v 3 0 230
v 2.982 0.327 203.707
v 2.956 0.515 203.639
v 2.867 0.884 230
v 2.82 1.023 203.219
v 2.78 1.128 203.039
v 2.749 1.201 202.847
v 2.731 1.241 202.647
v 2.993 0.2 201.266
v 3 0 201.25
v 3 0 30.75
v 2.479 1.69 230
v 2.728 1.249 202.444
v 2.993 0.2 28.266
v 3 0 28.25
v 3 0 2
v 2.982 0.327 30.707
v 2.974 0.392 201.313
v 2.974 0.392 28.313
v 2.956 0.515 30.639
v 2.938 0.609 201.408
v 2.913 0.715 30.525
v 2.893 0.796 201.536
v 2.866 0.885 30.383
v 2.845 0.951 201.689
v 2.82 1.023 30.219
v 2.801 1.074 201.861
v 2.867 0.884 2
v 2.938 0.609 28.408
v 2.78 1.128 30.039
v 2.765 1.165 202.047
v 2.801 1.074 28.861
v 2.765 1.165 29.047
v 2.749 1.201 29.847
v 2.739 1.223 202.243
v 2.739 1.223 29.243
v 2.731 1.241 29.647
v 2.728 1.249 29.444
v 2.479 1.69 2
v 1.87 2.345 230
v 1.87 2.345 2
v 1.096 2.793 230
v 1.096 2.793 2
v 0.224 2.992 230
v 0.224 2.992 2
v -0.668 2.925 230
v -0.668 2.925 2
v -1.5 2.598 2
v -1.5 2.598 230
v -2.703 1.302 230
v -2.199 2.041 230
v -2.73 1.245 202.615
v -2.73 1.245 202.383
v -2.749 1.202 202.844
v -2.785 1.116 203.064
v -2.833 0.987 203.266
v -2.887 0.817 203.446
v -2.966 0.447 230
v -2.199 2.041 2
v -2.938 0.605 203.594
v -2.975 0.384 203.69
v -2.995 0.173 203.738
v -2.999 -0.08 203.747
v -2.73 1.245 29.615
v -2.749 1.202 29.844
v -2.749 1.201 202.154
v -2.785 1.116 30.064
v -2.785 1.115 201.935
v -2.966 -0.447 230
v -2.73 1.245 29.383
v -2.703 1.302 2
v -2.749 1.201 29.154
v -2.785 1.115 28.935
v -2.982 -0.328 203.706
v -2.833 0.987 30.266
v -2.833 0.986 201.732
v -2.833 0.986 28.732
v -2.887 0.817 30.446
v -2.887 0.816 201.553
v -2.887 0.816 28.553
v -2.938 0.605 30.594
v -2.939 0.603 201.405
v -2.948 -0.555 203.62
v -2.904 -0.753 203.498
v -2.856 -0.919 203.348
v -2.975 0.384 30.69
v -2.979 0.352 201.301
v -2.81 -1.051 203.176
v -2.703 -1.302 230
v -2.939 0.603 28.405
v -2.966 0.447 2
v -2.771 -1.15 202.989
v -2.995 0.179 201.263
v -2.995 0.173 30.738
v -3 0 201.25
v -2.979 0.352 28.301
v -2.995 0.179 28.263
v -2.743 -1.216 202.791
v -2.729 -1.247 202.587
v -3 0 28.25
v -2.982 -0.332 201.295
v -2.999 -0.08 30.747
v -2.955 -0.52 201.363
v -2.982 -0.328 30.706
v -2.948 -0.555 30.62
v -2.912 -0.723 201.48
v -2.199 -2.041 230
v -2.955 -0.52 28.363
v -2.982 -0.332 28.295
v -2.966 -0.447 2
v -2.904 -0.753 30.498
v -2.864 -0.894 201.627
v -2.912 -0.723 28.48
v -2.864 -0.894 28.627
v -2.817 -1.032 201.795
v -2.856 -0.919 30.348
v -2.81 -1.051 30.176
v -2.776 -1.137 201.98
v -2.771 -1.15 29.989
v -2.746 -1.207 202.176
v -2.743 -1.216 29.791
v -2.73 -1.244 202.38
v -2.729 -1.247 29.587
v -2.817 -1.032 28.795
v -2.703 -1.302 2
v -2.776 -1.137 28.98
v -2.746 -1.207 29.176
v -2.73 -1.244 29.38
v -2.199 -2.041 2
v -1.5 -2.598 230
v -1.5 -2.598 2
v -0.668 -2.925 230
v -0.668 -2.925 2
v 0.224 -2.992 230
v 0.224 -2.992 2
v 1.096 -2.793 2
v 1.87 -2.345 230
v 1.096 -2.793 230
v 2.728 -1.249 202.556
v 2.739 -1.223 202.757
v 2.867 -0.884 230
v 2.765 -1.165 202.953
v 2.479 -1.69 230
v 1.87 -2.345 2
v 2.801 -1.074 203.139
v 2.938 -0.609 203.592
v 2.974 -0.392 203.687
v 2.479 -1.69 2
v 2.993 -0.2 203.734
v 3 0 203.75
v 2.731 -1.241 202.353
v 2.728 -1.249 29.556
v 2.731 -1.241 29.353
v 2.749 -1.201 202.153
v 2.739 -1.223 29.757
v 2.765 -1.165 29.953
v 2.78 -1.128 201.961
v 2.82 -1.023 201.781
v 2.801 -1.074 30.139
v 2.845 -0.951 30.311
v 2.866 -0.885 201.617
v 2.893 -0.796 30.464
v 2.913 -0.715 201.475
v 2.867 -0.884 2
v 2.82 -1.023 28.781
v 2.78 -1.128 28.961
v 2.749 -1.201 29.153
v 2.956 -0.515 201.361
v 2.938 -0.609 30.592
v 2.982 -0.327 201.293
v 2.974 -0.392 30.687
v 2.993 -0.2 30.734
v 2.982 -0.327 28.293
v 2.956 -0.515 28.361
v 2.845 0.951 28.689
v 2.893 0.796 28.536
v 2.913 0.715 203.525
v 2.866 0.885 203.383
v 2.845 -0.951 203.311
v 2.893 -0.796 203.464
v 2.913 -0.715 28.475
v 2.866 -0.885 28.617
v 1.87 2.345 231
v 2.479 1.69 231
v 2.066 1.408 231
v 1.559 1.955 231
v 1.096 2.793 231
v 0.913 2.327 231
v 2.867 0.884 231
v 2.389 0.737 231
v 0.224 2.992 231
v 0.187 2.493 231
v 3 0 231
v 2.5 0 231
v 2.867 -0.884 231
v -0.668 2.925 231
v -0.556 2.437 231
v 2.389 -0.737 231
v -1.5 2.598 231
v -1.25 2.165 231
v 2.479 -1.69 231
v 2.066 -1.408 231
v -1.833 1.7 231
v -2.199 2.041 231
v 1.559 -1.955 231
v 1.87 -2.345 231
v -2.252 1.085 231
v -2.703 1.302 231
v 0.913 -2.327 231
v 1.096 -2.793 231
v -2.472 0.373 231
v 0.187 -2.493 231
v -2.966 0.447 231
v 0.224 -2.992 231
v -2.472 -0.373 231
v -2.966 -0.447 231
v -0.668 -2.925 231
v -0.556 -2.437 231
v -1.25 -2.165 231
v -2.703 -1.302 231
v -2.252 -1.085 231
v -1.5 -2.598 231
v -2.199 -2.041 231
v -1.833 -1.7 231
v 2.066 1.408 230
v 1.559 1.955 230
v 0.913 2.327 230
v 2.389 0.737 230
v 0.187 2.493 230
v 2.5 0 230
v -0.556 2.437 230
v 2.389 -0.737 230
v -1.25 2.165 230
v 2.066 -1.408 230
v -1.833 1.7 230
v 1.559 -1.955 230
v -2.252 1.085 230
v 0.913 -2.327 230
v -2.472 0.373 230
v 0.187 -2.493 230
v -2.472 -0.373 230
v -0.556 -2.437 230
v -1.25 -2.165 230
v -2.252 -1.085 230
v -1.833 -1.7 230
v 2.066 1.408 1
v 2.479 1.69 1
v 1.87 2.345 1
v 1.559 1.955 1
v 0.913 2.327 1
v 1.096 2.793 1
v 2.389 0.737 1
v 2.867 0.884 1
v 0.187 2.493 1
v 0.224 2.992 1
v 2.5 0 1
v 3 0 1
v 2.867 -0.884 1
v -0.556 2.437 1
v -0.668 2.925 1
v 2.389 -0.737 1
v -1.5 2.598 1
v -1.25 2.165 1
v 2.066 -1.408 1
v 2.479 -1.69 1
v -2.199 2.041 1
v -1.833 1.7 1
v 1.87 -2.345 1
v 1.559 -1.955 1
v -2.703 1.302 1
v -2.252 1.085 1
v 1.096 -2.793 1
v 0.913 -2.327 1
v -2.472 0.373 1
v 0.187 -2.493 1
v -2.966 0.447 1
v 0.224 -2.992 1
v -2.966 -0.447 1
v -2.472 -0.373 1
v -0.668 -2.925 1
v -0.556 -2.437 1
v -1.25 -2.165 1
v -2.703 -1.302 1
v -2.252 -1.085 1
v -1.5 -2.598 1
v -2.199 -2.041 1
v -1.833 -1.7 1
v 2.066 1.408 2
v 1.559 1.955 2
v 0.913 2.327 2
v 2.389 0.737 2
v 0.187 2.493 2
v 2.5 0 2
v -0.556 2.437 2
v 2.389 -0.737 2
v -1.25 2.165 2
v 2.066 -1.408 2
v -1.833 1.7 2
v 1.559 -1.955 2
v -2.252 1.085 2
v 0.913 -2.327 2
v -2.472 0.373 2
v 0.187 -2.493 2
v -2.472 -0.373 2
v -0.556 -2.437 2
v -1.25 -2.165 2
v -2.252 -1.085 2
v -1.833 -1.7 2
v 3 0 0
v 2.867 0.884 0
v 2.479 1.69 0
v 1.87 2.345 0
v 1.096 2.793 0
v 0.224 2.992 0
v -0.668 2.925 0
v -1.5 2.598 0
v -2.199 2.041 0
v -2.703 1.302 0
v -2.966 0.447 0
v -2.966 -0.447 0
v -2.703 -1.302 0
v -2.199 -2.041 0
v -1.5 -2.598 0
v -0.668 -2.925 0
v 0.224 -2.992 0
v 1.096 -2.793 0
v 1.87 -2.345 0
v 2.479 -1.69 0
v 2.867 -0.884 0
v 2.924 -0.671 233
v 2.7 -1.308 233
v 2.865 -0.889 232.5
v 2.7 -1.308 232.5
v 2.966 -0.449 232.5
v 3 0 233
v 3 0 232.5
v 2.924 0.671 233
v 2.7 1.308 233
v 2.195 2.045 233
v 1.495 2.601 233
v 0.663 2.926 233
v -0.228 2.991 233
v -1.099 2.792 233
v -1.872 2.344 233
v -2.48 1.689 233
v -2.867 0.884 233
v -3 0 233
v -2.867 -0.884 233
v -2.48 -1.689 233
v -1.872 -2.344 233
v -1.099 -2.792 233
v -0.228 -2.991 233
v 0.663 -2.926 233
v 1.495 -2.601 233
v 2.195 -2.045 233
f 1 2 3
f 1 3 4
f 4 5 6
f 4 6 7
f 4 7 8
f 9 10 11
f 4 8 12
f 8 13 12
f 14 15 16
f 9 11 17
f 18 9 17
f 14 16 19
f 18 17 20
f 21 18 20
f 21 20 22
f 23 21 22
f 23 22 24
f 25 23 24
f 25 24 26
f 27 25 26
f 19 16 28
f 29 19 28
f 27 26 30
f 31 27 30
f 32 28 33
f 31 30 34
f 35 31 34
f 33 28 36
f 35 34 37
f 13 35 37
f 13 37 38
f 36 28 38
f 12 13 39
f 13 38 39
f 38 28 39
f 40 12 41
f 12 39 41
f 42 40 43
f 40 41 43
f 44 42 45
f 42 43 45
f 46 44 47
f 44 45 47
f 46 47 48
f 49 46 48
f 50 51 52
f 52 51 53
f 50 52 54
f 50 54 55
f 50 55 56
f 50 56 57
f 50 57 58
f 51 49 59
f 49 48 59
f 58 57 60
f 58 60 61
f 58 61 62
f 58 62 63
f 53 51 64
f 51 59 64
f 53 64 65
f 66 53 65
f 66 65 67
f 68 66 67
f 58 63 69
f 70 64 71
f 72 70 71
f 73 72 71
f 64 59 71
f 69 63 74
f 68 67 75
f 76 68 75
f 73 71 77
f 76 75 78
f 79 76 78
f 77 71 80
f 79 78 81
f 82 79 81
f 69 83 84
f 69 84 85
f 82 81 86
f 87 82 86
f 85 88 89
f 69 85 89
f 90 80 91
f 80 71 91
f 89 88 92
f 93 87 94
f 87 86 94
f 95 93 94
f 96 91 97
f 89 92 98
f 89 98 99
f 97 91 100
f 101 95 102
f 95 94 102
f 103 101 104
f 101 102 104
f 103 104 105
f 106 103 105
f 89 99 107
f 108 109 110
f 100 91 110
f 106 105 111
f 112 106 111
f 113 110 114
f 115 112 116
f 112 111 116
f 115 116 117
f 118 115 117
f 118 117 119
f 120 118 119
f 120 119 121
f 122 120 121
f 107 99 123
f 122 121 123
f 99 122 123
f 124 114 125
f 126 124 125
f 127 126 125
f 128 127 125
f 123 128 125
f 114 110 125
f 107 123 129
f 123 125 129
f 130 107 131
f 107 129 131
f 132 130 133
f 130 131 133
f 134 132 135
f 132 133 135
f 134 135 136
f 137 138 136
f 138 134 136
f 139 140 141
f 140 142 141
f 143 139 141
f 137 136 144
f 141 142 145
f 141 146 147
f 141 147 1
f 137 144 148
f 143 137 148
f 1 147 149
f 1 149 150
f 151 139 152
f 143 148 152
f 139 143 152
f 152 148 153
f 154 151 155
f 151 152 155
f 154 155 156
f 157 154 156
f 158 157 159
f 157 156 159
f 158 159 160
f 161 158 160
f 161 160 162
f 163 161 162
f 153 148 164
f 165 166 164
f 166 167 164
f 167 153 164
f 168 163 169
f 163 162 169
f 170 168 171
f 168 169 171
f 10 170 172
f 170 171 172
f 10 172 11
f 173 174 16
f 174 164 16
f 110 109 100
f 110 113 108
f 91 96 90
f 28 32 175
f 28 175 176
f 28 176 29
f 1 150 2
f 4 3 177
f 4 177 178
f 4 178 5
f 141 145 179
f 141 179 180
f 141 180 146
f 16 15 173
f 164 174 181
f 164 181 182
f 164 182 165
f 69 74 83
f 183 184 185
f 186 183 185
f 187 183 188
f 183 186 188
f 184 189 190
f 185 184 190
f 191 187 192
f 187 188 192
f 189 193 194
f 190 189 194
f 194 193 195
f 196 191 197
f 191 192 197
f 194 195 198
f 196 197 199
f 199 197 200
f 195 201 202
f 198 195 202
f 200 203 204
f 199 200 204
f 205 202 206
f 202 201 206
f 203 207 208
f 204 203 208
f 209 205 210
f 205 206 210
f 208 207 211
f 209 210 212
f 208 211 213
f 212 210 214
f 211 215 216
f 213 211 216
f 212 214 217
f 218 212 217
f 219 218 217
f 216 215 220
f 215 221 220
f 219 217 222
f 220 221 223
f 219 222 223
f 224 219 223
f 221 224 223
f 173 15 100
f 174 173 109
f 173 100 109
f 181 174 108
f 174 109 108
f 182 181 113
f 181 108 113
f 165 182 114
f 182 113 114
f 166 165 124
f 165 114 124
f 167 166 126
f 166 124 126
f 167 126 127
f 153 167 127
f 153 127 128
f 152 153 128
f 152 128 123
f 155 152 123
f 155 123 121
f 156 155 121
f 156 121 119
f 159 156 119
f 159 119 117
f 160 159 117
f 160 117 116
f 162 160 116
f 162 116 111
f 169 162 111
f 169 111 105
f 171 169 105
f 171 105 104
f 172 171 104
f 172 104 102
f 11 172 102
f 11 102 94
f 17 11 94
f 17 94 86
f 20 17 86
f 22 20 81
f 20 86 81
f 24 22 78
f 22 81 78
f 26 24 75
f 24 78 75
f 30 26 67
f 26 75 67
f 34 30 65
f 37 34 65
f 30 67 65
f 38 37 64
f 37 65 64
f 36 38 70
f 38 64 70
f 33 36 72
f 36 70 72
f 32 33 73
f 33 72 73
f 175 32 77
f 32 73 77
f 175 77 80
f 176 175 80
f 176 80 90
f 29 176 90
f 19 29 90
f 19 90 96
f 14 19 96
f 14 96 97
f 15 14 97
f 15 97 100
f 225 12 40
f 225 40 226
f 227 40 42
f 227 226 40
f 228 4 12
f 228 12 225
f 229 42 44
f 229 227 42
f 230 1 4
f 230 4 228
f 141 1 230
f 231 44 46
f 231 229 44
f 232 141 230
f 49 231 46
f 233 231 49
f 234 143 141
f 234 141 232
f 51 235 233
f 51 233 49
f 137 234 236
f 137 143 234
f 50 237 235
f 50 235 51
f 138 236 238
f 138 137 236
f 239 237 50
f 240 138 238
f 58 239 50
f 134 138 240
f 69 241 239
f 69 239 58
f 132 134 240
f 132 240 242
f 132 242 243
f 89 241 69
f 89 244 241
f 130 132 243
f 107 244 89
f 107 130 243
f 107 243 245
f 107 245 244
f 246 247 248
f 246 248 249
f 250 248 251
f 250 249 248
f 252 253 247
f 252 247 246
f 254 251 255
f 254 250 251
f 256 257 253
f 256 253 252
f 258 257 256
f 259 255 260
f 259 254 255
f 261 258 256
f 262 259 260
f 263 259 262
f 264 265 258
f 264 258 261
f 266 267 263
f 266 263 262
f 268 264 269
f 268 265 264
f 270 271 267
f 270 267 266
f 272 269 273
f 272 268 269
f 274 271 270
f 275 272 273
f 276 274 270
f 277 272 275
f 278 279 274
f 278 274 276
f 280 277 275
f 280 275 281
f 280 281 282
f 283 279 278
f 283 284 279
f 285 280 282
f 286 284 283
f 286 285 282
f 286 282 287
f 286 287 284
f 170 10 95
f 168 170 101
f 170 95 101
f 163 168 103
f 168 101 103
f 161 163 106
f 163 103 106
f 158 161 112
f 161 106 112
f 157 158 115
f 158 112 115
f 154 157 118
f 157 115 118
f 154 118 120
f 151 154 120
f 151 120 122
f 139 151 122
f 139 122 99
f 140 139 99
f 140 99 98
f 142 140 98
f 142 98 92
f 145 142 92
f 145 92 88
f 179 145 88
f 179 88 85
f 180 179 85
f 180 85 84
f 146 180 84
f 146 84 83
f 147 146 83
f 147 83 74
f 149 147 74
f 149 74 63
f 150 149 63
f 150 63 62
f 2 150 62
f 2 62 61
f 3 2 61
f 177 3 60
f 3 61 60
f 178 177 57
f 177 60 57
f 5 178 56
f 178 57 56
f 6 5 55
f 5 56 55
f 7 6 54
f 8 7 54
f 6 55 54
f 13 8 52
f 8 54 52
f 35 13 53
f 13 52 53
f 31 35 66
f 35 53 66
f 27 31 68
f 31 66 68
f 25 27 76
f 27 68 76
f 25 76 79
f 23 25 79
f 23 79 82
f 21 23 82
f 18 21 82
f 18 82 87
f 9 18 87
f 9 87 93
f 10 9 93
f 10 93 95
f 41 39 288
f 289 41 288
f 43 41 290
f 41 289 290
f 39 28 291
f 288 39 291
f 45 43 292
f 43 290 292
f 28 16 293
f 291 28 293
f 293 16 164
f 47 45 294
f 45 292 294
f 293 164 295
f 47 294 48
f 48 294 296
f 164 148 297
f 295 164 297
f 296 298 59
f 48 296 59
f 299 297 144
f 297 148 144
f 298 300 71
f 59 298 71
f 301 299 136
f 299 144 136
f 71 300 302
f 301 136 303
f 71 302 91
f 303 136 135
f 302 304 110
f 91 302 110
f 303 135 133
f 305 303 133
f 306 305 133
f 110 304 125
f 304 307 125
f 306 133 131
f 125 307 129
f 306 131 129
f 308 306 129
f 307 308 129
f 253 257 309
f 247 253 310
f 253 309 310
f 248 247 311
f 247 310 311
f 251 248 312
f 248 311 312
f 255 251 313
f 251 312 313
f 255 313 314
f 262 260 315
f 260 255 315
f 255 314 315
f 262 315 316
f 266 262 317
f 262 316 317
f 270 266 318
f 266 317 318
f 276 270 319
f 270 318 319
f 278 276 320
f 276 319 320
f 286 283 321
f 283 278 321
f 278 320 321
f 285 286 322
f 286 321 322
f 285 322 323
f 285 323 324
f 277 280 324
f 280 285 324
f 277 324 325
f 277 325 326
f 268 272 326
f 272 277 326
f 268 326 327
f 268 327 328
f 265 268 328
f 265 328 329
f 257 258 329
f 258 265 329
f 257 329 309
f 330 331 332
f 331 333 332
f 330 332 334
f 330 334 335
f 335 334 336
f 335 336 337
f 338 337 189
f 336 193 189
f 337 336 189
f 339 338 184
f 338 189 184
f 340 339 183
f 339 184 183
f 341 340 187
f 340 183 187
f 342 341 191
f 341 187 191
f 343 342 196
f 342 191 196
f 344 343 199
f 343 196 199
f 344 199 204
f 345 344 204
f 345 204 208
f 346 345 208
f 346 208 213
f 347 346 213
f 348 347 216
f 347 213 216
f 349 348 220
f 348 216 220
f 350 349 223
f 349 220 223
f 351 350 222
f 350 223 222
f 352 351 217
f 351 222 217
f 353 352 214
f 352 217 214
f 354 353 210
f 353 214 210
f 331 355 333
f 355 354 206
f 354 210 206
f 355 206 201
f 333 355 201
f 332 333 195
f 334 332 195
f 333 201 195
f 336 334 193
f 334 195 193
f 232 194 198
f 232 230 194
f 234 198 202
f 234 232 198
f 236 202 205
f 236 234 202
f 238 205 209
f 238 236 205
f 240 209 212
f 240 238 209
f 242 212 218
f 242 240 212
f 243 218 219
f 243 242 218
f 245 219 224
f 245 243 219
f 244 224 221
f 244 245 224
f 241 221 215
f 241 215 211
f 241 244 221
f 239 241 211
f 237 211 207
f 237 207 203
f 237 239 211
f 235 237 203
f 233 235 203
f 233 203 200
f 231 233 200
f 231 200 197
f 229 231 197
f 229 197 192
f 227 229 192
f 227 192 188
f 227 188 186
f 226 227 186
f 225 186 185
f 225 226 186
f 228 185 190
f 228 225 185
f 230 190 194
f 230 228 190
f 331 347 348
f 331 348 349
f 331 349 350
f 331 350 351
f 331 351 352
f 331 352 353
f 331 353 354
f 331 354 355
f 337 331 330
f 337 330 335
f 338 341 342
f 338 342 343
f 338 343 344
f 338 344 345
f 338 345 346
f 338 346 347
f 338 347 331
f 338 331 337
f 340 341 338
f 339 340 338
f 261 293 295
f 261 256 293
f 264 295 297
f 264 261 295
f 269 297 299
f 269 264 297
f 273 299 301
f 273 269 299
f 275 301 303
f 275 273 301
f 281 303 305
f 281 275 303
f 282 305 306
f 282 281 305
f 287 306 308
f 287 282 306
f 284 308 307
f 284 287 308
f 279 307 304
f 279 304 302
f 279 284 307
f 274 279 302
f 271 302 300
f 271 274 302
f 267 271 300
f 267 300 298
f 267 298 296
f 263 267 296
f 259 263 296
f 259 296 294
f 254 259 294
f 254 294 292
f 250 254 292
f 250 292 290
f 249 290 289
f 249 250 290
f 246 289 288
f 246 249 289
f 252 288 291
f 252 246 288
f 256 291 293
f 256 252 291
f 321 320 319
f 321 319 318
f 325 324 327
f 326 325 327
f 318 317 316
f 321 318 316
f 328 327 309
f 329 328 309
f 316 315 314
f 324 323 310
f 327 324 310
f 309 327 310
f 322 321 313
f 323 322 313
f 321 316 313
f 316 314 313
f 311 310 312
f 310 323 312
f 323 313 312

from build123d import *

# Parameters (mm, degrees)
SKETCH1_R           = 3
BOSS_EXTRUDE1_DEPTH = 233
SKETCH2_W           = 0.5
SKETCH2_H           = 1
CUT_EXTRUDE1_DEPTH  = 0.5
M3_TAPPED_HOLE1_D   = 2.5
SKETCH6_W           = 0.5
SKETCH6_H           = 1
BOSS_EXTRUDE2_DEPTH = 0.5


with BuildPart() as part:
    # Sketch1 → Boss-Extrude1 (new body)
    with BuildSketch(Plane.XY):
        Circle(SKETCH1_R)
    extrude(amount=BOSS_EXTRUDE1_DEPTH)

    # Sketch2 → Cut-Revolve1 (revolve, cut)
    with BuildSketch(Plane(origin=(0, 0, 0), x_dir=(1, 0, 0), z_dir=(0, 1, 0))):
        with Locations((2.75, -1.5)):
            Rectangle(SKETCH2_W, SKETCH2_H)
    revolve(axis=Axis((0, 0, 233), (0, 0, -1)), mode=Mode.SUBTRACT)

    # Sketch3 → Cut-Extrude1 (cut)
    with BuildSketch(Plane.XY.offset(233)):
        with BuildLine():
            Line((2.7, 1.307669683), (2.7, -1.307669683))
            ThreePointArc((2.7, -1.307669683), (3, 0), (2.7, 1.307669683))
        make_face()
    extrude(amount=-CUT_EXTRUDE1_DEPTH, mode=Mode.SUBTRACT)

    # M3 Tapped Hole1 (through all)
    with Locations(Plane(origin=(3.7, 0, 29.5), x_dir=(0, 0, 1), z_dir=(1, 0, 0))):
        with Locations((0, 0), (173, 0)):
            Hole(M3_TAPPED_HOLE1_D / 2)

    # Sketch6 → Cut-Revolve2 (revolve, cut)
    with BuildSketch(Plane(origin=(0, 0, 0), x_dir=(1, 0, 0), z_dir=(0, 1, 0))):
        with Locations((2.75, -230.5)):
            Rectangle(SKETCH6_W, SKETCH6_H)
    revolve(axis=Axis((0, 0, 233), (0, 0, -1)), mode=Mode.SUBTRACT)

    # Sketch7 → Boss-Extrude2 (add)
    with BuildSketch(Plane.XY.offset(232.5)):
        with BuildLine():
            Line((2.7, 1.307669683), (2.7, -1.307669683))
            ThreePointArc((2.7, -1.307669683), (3, 0), (2.7, 1.307669683))
        make_face()
    extrude(amount=BOSS_EXTRUDE2_DEPTH)


solid = part.part
